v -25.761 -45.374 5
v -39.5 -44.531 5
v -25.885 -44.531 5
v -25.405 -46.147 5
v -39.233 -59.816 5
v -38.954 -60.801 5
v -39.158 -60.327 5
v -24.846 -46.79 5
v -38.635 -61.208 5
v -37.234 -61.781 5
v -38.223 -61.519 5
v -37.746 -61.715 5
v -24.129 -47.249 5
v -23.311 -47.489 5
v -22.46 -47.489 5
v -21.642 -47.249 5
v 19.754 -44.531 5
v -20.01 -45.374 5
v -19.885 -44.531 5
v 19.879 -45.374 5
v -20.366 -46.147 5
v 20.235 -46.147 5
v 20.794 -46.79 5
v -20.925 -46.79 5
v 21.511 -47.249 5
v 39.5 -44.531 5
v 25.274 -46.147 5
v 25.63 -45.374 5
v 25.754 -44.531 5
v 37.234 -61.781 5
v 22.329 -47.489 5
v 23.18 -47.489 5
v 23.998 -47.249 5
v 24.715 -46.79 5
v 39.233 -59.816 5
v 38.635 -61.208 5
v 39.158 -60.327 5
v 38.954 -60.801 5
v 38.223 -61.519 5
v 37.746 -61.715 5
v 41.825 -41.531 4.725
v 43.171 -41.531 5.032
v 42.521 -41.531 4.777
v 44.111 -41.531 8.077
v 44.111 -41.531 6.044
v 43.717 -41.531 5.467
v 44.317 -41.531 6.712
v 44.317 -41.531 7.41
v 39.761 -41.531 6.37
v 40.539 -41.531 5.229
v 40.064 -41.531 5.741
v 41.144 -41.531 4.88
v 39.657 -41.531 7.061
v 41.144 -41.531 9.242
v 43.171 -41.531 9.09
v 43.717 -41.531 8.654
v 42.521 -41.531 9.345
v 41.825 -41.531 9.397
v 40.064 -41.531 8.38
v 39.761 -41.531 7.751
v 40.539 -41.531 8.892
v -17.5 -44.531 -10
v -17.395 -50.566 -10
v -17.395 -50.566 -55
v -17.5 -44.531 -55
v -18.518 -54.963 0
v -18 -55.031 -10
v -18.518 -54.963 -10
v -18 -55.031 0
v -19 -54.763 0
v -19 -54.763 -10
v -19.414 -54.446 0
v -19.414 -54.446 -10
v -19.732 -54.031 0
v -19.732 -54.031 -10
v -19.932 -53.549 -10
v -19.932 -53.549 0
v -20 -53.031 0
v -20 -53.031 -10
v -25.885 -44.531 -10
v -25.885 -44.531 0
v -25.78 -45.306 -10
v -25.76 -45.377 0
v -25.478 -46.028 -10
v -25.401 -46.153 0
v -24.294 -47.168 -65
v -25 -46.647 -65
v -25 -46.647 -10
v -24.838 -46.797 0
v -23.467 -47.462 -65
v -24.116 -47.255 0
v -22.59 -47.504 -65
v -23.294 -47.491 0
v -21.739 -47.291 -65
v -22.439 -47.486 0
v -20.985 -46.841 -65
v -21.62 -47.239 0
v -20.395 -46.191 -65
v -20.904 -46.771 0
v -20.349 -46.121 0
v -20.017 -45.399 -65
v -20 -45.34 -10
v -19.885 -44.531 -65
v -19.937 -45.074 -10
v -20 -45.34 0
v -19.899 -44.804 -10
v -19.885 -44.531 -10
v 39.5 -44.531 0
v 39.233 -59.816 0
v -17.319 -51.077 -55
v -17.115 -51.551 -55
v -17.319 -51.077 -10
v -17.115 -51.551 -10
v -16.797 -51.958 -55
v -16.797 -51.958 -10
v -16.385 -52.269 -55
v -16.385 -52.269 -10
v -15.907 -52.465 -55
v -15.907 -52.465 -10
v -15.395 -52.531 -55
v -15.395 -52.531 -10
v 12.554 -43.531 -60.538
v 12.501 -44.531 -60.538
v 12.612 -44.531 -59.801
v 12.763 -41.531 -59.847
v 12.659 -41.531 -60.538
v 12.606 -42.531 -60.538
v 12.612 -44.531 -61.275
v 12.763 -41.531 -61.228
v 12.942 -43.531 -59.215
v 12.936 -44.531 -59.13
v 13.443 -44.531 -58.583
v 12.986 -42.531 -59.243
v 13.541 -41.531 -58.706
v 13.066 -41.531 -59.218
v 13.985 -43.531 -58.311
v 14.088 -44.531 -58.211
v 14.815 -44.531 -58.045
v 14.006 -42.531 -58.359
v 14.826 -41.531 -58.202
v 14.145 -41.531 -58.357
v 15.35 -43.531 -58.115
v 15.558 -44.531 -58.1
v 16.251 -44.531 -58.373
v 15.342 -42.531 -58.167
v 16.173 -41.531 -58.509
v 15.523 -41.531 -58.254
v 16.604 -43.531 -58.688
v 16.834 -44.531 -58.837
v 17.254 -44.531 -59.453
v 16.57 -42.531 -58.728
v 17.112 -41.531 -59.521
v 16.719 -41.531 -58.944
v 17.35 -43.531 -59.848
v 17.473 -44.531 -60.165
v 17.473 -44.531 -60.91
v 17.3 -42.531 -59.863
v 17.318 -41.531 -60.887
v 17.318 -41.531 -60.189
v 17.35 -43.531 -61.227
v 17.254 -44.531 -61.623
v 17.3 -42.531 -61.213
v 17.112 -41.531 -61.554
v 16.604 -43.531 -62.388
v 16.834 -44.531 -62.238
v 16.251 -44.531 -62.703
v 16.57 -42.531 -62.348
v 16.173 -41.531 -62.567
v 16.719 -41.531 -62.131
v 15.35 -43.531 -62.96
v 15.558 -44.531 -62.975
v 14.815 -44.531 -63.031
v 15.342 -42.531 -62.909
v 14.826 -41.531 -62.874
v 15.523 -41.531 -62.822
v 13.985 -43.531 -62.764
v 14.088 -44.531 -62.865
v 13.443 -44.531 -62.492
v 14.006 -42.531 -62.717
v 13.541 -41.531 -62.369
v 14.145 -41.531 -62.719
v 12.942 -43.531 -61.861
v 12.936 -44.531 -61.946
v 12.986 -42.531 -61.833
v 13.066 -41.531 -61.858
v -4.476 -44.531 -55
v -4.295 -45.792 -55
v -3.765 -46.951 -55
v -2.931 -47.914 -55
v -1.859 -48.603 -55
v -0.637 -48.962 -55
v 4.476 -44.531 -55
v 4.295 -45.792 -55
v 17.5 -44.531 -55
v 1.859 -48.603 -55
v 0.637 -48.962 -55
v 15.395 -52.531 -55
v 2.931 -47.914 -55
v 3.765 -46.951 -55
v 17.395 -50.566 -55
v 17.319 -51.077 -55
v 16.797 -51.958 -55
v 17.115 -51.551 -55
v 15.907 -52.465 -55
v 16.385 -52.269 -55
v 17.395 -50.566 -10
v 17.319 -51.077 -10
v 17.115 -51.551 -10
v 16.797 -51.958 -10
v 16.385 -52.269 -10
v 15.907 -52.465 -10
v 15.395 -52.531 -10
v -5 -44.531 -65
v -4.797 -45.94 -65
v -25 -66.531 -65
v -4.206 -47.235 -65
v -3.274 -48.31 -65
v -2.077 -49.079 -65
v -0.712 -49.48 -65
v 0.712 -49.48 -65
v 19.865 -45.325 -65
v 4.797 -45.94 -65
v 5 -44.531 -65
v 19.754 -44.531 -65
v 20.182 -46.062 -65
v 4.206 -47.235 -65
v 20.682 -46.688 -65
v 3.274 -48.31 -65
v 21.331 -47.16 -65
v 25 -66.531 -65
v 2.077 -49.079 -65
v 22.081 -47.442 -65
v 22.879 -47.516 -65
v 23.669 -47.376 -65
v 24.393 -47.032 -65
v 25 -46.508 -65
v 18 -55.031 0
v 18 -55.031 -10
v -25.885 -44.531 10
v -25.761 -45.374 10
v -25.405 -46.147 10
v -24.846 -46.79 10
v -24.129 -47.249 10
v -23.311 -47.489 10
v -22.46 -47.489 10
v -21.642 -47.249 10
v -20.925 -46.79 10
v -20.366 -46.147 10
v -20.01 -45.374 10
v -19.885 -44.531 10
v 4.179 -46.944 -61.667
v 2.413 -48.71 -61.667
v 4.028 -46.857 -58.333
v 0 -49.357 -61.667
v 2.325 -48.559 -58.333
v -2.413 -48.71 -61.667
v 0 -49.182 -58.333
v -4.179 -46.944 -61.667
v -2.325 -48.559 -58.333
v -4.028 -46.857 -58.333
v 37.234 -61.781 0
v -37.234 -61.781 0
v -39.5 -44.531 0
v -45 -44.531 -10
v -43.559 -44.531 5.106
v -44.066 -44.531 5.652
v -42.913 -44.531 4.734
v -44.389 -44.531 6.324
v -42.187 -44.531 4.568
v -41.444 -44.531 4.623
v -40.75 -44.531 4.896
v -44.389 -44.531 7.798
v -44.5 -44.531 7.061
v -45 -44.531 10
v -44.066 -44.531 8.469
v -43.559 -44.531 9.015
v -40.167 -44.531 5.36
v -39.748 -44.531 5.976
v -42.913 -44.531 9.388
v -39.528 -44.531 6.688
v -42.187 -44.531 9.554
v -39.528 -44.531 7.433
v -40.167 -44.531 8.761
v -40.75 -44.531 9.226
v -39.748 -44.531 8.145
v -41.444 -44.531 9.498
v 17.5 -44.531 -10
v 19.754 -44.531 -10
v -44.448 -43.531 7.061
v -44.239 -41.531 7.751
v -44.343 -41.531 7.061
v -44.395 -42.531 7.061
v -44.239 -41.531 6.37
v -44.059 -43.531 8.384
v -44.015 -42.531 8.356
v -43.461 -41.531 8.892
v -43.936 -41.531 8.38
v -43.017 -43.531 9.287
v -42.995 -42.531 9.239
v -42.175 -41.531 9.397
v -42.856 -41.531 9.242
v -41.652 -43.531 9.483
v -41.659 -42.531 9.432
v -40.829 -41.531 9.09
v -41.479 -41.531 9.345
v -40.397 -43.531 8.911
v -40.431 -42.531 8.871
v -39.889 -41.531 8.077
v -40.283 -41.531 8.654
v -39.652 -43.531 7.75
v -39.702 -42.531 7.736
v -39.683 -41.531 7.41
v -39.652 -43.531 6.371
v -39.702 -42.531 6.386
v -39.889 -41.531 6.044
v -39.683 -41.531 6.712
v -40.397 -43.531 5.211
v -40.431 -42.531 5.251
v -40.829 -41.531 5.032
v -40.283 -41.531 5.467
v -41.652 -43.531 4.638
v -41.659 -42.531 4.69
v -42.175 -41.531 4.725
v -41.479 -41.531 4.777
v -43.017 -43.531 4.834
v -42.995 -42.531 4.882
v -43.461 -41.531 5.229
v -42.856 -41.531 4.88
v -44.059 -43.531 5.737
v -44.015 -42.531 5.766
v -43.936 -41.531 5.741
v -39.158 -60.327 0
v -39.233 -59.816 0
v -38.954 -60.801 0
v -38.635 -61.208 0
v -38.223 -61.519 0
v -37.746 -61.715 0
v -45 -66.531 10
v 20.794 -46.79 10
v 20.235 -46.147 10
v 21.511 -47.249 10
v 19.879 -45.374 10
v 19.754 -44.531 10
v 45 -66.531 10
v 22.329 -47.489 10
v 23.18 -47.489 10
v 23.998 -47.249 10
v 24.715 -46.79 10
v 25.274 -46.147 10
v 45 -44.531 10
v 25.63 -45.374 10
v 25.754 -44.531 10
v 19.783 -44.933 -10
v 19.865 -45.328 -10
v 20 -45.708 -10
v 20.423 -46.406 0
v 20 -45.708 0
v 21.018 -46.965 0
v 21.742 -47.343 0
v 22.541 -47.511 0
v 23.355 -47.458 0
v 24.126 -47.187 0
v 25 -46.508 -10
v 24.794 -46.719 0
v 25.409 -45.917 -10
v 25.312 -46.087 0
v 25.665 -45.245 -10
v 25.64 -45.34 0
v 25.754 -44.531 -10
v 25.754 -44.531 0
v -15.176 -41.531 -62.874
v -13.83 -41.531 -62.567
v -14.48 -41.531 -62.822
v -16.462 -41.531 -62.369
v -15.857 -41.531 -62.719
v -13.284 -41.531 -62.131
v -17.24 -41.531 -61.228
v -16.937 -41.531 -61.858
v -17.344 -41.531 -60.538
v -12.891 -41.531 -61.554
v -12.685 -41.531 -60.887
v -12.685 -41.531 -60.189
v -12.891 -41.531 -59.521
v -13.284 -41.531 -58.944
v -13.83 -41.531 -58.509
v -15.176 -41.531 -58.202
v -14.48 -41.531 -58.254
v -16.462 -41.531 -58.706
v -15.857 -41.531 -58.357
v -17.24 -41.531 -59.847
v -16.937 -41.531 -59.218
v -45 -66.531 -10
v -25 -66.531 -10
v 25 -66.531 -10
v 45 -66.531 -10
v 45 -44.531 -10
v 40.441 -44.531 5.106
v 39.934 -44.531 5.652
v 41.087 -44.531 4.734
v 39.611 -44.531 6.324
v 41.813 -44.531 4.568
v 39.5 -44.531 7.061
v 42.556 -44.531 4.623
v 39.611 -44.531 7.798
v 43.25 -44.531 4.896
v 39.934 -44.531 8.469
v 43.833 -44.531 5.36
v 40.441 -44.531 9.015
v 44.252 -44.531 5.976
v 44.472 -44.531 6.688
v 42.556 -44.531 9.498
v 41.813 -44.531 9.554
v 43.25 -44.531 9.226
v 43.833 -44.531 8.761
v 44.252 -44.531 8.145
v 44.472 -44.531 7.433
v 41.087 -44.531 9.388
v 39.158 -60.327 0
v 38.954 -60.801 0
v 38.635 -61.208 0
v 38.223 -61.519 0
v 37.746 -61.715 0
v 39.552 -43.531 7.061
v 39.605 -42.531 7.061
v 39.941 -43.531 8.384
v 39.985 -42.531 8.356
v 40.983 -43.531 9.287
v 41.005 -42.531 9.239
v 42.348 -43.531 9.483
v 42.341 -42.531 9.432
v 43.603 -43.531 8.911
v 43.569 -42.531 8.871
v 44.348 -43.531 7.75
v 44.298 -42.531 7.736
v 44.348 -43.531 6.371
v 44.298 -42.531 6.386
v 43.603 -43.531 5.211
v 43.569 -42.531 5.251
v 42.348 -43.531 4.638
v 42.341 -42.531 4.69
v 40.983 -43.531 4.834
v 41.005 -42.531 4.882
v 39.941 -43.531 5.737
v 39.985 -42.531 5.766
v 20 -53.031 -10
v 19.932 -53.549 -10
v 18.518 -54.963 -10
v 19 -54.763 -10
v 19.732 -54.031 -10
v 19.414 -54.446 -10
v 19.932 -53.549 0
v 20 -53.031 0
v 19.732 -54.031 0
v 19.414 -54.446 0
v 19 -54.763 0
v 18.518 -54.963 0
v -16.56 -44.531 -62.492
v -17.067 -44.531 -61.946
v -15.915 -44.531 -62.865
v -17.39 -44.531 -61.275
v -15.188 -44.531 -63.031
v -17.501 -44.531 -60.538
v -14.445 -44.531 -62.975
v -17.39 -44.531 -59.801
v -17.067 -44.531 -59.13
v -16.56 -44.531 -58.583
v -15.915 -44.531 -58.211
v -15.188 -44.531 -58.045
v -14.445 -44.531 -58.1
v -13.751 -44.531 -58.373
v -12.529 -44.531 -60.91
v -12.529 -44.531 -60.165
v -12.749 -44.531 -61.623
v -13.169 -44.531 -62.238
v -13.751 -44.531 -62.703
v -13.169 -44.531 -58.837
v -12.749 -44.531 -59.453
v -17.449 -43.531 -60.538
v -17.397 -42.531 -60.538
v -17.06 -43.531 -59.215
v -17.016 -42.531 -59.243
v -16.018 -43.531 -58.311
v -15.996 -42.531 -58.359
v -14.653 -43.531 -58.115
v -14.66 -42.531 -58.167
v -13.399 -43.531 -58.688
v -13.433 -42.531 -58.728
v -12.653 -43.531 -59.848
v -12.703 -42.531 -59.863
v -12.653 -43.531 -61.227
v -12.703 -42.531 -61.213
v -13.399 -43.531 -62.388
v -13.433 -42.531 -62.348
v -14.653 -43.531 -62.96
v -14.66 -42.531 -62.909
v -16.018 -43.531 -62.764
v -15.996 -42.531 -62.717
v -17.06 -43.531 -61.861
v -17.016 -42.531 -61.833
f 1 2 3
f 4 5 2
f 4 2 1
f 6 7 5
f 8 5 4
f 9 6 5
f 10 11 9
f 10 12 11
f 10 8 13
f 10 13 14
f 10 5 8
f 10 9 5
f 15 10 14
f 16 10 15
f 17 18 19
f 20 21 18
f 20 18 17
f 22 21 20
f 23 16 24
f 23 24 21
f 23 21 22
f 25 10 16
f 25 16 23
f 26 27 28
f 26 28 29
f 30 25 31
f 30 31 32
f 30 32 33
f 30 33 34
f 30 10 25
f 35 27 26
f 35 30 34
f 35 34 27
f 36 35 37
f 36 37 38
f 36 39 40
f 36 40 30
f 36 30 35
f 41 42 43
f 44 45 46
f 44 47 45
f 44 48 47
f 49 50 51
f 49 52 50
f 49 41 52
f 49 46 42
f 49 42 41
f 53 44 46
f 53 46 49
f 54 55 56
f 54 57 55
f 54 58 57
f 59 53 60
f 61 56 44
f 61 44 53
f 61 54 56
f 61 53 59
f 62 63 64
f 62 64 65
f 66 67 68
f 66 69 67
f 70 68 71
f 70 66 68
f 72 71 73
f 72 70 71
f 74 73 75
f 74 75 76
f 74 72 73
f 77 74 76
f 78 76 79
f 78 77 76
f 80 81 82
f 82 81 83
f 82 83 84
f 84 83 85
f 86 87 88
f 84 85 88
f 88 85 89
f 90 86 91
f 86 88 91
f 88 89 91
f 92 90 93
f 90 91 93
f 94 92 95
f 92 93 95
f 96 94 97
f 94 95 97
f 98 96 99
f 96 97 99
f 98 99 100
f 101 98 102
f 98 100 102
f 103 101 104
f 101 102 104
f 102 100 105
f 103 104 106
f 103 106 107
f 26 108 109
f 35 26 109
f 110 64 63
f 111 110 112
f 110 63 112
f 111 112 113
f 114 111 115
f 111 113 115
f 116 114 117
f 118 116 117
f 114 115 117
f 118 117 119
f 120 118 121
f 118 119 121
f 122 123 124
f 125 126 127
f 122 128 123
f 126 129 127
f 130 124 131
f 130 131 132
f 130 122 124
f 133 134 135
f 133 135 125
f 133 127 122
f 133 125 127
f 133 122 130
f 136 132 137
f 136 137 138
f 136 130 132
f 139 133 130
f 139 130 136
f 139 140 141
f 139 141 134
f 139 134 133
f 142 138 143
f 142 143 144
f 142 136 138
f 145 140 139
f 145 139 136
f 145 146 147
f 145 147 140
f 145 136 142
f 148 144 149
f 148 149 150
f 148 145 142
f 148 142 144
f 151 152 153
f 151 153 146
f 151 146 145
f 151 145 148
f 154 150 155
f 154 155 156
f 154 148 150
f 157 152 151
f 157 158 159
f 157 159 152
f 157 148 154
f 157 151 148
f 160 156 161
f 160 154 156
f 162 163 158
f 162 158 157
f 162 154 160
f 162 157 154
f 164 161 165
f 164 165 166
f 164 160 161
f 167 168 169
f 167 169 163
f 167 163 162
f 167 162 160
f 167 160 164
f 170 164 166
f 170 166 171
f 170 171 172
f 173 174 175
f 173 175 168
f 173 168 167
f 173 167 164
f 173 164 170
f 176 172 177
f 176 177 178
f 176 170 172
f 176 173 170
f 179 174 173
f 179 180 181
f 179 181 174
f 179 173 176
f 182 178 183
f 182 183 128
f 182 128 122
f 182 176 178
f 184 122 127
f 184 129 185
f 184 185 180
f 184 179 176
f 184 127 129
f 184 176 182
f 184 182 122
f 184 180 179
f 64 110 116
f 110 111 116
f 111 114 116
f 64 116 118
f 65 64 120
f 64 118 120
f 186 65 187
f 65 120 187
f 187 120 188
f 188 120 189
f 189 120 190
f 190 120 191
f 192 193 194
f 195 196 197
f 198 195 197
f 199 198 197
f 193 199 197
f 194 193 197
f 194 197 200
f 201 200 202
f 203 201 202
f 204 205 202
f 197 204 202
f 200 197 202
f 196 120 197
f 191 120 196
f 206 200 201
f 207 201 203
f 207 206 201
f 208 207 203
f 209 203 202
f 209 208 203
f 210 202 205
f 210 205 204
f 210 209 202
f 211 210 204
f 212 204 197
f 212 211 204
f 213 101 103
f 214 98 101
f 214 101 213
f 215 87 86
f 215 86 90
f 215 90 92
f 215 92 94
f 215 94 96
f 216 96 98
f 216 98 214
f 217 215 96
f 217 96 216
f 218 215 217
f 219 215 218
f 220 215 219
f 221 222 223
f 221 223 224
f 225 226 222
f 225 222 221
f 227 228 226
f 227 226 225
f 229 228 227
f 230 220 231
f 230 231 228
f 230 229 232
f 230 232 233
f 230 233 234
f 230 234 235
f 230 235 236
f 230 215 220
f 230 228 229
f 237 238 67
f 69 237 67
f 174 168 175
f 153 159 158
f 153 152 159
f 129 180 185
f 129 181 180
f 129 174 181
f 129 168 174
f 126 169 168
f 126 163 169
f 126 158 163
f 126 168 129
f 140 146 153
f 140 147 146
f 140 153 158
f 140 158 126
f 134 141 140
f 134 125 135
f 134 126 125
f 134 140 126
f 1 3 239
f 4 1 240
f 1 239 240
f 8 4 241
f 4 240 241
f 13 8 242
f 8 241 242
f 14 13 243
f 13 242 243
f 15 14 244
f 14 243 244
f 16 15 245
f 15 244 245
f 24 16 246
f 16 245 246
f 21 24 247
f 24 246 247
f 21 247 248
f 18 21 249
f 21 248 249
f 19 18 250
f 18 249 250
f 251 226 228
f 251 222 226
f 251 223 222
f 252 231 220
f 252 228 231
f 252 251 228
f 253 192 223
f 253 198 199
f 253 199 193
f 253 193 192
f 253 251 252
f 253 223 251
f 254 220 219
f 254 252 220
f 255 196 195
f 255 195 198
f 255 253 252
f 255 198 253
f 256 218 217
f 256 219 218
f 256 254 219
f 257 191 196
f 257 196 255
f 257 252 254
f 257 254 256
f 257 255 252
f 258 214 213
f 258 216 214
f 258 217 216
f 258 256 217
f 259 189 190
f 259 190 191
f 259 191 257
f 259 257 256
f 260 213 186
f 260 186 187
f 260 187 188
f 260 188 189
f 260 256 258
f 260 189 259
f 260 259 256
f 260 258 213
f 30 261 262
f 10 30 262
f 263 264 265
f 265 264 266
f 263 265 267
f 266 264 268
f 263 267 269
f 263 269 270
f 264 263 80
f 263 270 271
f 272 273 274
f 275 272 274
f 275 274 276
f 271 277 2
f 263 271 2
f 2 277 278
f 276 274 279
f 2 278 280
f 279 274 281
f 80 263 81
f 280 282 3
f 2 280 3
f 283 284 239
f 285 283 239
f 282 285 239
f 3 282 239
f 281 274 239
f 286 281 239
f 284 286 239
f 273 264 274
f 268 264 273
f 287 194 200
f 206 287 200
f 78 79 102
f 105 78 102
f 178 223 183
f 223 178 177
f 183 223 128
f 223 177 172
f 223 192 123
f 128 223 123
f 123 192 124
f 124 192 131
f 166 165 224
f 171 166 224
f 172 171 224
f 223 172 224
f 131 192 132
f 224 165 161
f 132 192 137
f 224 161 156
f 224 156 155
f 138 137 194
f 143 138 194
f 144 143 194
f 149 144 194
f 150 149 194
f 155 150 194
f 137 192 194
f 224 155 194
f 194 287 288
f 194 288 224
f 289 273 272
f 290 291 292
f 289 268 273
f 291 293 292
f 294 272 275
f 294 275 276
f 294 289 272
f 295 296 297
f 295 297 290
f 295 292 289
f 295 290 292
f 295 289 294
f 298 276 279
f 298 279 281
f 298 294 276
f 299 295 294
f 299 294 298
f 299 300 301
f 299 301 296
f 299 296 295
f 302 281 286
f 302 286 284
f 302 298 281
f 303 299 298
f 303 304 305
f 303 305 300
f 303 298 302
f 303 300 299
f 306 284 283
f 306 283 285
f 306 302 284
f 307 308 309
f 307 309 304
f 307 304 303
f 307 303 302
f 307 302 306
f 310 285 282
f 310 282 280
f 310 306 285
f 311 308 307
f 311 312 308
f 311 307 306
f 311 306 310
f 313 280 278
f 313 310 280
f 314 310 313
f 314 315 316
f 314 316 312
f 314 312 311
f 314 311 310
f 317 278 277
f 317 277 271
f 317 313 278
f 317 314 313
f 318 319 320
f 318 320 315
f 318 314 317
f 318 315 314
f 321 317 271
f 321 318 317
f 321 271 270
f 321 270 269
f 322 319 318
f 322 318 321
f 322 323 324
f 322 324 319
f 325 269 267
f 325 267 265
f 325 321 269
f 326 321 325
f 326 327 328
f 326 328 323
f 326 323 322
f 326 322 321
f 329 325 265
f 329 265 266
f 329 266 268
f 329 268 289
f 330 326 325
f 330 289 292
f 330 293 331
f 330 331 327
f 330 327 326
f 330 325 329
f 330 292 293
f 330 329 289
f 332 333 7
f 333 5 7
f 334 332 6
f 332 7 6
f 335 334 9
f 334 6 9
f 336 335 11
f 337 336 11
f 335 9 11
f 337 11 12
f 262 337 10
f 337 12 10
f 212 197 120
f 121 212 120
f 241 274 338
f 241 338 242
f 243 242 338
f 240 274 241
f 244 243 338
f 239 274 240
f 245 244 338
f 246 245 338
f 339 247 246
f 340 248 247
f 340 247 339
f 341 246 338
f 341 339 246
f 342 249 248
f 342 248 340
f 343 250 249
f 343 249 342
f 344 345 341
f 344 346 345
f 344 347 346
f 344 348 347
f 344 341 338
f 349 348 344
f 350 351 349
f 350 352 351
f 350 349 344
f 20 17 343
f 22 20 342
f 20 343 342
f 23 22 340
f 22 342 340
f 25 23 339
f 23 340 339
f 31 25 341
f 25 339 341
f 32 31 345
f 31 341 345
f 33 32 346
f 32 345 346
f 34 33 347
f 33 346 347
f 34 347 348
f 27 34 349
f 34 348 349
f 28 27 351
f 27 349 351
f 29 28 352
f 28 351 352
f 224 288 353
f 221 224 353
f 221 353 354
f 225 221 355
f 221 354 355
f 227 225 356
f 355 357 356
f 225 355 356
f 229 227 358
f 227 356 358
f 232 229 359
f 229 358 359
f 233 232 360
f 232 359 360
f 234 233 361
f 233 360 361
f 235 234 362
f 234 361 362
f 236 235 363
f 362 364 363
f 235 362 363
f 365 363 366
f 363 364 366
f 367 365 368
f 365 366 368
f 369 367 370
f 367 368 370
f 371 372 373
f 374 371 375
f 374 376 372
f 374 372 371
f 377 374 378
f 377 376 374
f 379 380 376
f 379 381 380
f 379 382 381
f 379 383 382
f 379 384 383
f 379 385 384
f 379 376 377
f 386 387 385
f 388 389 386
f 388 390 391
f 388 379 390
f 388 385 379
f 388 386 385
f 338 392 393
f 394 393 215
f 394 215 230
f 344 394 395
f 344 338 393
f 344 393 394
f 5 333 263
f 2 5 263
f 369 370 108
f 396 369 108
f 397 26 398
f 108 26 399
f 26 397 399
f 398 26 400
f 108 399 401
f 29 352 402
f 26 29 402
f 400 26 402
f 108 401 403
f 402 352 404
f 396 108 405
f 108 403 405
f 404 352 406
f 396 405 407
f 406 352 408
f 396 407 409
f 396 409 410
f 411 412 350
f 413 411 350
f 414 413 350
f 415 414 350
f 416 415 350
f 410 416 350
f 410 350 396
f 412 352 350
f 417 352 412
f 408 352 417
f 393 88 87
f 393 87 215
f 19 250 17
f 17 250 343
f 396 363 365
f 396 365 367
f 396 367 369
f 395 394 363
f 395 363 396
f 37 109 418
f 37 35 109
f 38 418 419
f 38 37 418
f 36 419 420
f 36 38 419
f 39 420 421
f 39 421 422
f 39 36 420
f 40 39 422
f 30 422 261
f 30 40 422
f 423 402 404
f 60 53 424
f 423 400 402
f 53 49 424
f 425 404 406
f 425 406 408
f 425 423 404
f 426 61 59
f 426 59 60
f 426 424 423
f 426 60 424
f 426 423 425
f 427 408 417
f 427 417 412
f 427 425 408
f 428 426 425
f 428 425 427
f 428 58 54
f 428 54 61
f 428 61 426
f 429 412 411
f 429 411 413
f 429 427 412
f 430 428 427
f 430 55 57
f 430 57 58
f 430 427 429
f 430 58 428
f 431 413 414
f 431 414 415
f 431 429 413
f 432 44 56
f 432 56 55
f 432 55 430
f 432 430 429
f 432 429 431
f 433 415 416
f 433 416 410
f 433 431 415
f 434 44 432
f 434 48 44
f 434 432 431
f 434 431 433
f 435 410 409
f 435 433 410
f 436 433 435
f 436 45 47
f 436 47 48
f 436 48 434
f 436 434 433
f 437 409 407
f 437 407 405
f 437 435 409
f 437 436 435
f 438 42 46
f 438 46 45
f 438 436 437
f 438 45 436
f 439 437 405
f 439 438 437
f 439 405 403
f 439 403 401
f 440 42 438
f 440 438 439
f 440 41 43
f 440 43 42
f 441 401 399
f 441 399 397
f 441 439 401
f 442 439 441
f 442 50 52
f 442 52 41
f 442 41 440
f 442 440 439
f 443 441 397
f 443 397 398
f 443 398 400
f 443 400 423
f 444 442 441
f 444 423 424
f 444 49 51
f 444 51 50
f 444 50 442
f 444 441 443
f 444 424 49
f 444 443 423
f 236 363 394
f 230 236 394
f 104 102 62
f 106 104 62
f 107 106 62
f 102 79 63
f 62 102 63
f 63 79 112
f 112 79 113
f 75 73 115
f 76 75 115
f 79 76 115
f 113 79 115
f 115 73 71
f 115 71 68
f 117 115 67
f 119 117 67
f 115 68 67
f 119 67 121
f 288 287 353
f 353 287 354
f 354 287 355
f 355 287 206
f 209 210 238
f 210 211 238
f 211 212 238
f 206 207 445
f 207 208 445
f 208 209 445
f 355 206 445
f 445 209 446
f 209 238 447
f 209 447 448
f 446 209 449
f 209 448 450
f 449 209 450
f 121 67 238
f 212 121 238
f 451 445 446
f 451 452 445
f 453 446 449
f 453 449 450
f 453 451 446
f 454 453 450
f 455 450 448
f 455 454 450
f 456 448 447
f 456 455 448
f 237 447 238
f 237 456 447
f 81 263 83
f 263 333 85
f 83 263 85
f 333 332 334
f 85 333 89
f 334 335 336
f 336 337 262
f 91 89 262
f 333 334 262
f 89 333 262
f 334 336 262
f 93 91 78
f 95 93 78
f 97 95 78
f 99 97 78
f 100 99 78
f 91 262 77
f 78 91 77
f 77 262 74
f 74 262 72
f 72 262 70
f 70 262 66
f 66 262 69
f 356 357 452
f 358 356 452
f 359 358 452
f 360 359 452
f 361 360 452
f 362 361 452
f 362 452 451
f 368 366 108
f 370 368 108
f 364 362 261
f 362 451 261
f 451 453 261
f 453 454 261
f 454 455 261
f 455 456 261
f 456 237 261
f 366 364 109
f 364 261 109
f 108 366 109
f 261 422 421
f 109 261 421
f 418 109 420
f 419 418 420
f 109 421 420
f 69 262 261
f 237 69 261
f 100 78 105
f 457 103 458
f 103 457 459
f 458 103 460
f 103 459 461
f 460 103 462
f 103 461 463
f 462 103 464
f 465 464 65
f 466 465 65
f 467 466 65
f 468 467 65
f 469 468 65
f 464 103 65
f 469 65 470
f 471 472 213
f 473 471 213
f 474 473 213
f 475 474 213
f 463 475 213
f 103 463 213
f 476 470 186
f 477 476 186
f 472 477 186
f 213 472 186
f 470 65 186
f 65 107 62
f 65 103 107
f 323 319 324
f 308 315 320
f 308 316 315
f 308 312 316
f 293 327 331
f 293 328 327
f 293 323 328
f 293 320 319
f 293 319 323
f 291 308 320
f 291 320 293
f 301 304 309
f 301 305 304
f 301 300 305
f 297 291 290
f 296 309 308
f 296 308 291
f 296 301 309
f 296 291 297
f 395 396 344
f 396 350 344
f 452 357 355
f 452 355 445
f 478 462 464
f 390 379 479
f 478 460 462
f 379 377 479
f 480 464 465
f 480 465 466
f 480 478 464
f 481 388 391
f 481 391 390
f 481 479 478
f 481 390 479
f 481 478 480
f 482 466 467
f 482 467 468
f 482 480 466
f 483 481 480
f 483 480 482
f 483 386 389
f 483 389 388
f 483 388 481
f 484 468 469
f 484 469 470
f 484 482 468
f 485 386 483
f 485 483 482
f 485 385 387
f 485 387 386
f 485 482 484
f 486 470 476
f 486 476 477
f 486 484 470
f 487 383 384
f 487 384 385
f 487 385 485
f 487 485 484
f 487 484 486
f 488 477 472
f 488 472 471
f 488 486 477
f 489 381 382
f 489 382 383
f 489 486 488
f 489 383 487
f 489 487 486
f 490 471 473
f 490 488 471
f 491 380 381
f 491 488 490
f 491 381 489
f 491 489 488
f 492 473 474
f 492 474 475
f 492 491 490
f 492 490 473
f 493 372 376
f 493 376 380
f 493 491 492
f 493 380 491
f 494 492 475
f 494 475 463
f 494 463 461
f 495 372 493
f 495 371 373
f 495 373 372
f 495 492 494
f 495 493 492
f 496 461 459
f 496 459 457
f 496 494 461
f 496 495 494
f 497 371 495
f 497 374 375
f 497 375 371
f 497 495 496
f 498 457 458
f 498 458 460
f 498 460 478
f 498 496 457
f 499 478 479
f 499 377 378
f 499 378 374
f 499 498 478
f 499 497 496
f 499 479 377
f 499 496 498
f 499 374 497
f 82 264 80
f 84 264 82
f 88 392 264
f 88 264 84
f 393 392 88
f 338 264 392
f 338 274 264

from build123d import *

# Parameters (mm, degrees)
F0_W      = 90
F0_H      = 22
F1_DEPTH  = 10
F3_DEPTH  = 5
F4_R      = 2
F5_W      = 90
F5_H      = 22
F6_DEPTH  = 10
F8_DEPTH  = 10
F9_R      = 2
F11_DEPTH = 45
F13_DEPTH = 45
F14_R     = 2
F15_W     = 50
F15_H     = 22
F16_DEPTH = 10
F17_R     = 5
F18_DEPTH = 25
F18_TAPER = 3
F20_R     = 3
F21_DEPTH = 90
F22_R     = 2.5
F23_DEPTH = 3
F23_TAPER = 3
F24_R     = 2.5
F25_DEPTH = 3
F25_TAPER = 3


with BuildPart() as f1:
    # F0 (on Top) → F1 (new body)
    with BuildSketch(Plane.XY):
        with Locations((0, -55.5313304067)):
            Rectangle(F0_W, F0_H)
    extrude(amount=F1_DEPTH)

    # F2 (on face) → F3 (cut)
    with BuildSketch(Plane(origin=(0, 0, 0), x_dir=(1, 0, 0), z_dir=(0, 0, -1))):
        Polygon((-39.5, 44.5313304067), (0, 44.5313304067), (39.5, 44.5313304067), (39.19890013, 61.7813304067), (-39.19890013, 61.7813304067), align=None)
    extrude(amount=-F3_DEPTH, mode=Mode.SUBTRACT)

    # F4
    f4_edges = [f1.edges().sort_by_distance(p)[0] for p in [
        (-39.1989, -61.78133, 2.5),
        (39.1989, -61.78133, 2.5),
    ]]
    fillet(f4_edges, radius=F4_R)

    # F5 (on face) → F6 (join)
    with BuildSketch(Plane(origin=(0, 0, 0), x_dir=(1, 0, 0), z_dir=(0, 0, -1))):
        with Locations((0, 55.5313304067)):
            Rectangle(F5_W, F5_H)
    extrude(amount=F6_DEPTH)

    # F7 (on face) → F8 (cut)
    with BuildSketch(Plane(origin=(0, 0, -10), x_dir=(1, 0, 0), z_dir=(0, 0, -1))):
        Polygon((-20, 44.5313304067), (0, 44.5313304067), (20, 44.5313304067), (19.8167218183, 55.0313304067), (-19.8167218183, 55.0313304067), align=None)
        Polygon((19.8167218183, 55.0313304067), (20, 44.5313304067), (20, 55.0313304067), align=None)
        Polygon((-20, 55.0313304067), (-20, 44.5313304067), (-19.8167218183, 55.0313304067), align=None)
    extrude(amount=-F8_DEPTH, mode=Mode.SUBTRACT)

    # F9
    f9_edges = [f1.edges().sort_by_distance(p)[0] for p in [
        (-20, -55.03133, -5),
        (20, -55.03133, -5),
    ]]
    fillet(f9_edges, radius=F9_R)

    # F10 (on face) → F11 (join)
    with BuildSketch(Plane(origin=(0, 0, -10), x_dir=(1, 0, 0), z_dir=(0, 0, -1))):
        Polygon((-25, 44.5313304067), (0, 44.5313304067), (25, 44.5313304067), (25, 66.5313304067), (-25, 66.5313304067), align=None)
    extrude(amount=F11_DEPTH)

    # F12 (on face) → F13 (cut)
    with BuildSketch(Plane(origin=(0, 0, -55), x_dir=(1, 0, 0), z_dir=(0, 0, -1))):
        Polygon((-17.5, 44.5313304067), (0, 44.5313304067), (17.5, 44.5313304067), (17.3603594806, 52.5313304067), (-17.3603594806, 52.5313304067), align=None)
    extrude(amount=-F13_DEPTH, mode=Mode.SUBTRACT)

    # F14
    f14_edges = [f1.edges().sort_by_distance(p)[0] for p in [
        (-17.360359, -52.53133, -32.5),
        (17.360359, -52.53133, -32.5),
    ]]
    fillet(f14_edges, radius=F14_R)

    # F15 (on face) → F16 (join)
    with BuildSketch(Plane(origin=(0, 0, -55), x_dir=(1, 0, 0), z_dir=(0, 0, -1))):
        with Locations((0, 55.5313304067)):
            Rectangle(F15_W, F15_H)
    extrude(amount=F16_DEPTH)

    # F17 (on face) → F18 (cut)
    with BuildSketch(Plane(origin=(0, 0, -65), x_dir=(1, 0, 0), z_dir=(0, 0, -1))):
        with Locations((0, 44.5313304067)):
            Circle(F17_R)
    extrude(amount=-F18_DEPTH, taper=F18_TAPER, mode=Mode.SUBTRACT)

    # F20 (on face) → F21 (cut)
    with BuildSketch(Plane.XY.offset(10)):
        with Locations((22.7543748915, -44.5189550519)):
            Circle(F20_R)
        with Locations((-22.8854361922, -44.5189550519)):
            Circle(F20_R)
    extrude(amount=-F21_DEPTH, mode=Mode.SUBTRACT)

    # F22 (on face) → F23 (join)
    with BuildSketch(Plane(origin=(0, -44.5313304067, 0), x_dir=(-1, 0, 0), z_dir=(0, 1, 0))):
        with Locations((-15.0013593957, -60.537815094)):
            Circle(F22_R)
        with Locations((15.0013593957, -60.537815094)):
            Circle(F22_R)
    extrude(amount=F23_DEPTH, taper=F23_TAPER)

    # F24 (on face) → F25 (join)
    with BuildSketch(Plane(origin=(0, -44.5313304067, 0), x_dir=(-1, 0, 0), z_dir=(0, 1, 0))):
        with Locations((-42, 7.0607517846)):
            Circle(F24_R)
        with Locations((42, 7.0607517846)):
            Circle(F24_R)
    extrude(amount=F25_DEPTH, taper=F25_TAPER)


solid = f1.part
